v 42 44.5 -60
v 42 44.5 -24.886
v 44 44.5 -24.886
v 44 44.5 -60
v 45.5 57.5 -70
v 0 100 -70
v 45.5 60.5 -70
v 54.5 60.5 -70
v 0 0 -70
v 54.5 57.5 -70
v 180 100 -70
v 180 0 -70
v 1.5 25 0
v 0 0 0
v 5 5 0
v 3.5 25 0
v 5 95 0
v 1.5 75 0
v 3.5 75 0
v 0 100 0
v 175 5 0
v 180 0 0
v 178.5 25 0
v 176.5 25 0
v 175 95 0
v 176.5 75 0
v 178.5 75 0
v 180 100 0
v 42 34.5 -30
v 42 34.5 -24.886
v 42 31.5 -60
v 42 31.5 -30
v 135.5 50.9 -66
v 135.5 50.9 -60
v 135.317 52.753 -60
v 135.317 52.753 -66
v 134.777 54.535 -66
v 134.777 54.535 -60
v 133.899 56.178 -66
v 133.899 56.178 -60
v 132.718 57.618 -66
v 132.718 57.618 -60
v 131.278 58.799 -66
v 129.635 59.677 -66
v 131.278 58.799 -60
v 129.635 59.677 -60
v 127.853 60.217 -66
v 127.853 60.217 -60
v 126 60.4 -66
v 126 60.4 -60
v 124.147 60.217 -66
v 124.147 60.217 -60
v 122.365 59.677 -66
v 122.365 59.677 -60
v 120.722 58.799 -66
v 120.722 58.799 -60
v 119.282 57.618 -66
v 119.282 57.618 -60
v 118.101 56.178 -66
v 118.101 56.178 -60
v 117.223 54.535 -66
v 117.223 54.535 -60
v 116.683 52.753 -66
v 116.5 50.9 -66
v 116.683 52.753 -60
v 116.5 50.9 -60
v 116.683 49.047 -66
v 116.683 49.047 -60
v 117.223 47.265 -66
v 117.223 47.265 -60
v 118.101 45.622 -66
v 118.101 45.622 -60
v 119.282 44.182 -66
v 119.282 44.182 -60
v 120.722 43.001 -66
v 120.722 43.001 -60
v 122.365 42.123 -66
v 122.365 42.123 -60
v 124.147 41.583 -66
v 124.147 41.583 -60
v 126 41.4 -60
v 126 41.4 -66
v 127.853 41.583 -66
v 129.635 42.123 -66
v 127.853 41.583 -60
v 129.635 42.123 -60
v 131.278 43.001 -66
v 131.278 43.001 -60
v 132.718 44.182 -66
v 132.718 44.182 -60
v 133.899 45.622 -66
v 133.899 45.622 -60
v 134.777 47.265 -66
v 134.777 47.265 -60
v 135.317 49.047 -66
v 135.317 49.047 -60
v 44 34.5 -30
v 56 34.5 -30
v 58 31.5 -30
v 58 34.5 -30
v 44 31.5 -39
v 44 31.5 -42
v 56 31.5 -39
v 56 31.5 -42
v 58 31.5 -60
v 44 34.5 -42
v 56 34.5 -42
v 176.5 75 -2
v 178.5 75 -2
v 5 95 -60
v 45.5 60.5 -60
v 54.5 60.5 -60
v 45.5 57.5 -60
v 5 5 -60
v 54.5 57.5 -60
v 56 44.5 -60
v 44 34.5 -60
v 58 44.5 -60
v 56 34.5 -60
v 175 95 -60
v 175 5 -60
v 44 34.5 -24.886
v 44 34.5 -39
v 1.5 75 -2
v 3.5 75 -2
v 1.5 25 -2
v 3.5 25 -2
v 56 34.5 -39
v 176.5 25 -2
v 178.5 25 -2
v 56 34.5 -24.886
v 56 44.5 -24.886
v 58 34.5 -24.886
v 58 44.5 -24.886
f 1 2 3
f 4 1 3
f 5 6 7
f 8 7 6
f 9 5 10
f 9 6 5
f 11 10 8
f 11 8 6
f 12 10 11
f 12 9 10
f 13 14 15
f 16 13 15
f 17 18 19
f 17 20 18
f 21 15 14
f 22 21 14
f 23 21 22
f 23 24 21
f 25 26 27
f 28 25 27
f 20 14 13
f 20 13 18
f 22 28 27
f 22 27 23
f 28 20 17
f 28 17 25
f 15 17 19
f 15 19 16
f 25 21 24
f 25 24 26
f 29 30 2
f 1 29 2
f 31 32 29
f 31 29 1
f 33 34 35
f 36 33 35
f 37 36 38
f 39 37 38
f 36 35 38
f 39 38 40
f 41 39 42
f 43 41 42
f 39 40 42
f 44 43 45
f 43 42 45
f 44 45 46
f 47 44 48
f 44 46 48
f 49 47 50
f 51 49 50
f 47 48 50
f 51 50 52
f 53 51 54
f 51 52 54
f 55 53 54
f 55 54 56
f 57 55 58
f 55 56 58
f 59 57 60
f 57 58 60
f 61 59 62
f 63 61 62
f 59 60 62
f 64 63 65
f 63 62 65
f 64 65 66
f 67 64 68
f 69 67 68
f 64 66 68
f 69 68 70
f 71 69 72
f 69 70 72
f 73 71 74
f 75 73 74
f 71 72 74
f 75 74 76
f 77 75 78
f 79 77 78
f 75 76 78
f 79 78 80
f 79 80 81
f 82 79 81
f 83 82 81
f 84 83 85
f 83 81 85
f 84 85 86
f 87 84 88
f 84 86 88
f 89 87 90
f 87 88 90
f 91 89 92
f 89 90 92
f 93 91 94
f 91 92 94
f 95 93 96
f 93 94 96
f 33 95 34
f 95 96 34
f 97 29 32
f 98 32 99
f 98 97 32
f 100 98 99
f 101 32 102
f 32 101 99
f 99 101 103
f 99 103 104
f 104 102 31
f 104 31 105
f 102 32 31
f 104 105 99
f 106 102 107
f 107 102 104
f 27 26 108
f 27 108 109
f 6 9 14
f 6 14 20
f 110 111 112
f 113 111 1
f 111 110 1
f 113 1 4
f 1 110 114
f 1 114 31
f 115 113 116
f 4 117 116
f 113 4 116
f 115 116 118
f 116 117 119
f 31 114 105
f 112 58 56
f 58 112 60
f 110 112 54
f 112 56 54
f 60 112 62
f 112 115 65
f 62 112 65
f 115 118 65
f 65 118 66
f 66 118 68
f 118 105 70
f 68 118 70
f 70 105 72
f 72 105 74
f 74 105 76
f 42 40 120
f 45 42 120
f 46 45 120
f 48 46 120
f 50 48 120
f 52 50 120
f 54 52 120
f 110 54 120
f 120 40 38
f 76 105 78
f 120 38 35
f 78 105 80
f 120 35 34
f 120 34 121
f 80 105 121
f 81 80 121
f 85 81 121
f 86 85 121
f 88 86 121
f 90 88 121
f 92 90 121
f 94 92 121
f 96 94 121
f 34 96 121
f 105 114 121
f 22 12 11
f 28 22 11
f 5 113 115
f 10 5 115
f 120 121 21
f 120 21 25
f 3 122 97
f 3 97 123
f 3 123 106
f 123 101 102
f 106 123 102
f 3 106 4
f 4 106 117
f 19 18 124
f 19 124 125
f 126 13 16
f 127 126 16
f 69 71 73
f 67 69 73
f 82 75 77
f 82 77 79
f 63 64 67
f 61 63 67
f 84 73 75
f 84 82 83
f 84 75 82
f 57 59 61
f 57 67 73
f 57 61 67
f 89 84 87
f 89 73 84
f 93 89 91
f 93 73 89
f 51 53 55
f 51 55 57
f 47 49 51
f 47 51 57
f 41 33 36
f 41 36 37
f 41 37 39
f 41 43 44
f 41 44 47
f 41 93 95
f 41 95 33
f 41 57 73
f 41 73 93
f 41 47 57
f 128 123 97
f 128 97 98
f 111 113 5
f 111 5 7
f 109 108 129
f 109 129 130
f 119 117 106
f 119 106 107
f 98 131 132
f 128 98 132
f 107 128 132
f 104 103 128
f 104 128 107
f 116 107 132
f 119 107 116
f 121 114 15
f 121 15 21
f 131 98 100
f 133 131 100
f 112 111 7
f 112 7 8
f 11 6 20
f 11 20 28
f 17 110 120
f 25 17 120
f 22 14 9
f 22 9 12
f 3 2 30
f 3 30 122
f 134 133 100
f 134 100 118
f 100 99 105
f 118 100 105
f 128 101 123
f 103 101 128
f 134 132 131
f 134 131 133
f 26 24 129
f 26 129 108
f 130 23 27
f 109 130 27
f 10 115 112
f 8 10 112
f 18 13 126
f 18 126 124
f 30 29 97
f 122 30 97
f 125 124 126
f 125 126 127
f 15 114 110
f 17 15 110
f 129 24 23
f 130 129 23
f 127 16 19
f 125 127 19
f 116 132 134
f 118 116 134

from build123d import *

# Parameters (mm, degrees)
SCHIZZO1_W                   = 180
SCHIZZO1_H                   = 60
ESTRUSIONE_ESTRUSIONE1_DEPTH = 5
SCHIZZO1_3_W                 = 180
SCHIZZO1_3_H                 = 10
ESTRUSIONE_ESTRUSIONE2_DEPTH = 100
SCHIZZO2_W                   = 180
SCHIZZO2_H                   = 5
ESTRUSIONE_ESTRUSIONE3_DEPTH = 60
SCHIZZO3_W                   = 5
SCHIZZO3_H                   = 90
ESTRUSIONE_ESTRUSIONE4_DEPTH = 60
SCHIZZO4_W                   = 12
SCHIZZO4_H                   = 3
TAGLIO_ESTRUSIONE1_DEPTH     = 90
SCHIZZO6_W                   = 2
SCHIZZO6_H                   = 15.540639337
ESTRUSIONE_ESTRUSIONE5_DEPTH = 10
SCHIZZO10_W                  = 16
SCHIZZO10_H                  = 3
ESTRUSIONE_ESTRUSIONE7_DEPTH = 30
SCHIZZO11_W                  = 12
SCHIZZO11_H                  = 3
TAGLIO_ESTRUSIONE6_DEPTH     = 5
SCHIZZO12_W                  = 9
SCHIZZO12_H                  = 3
TAGLIO_ESTRUSIONE7_DEPTH     = 20
SCHIZZO13_W                  = 2
SCHIZZO13_H                  = 35.114164676
ESTRUSIONE_ESTRUSIONE8_DEPTH = 10
TAGLIO_ESTRUSIONE8_START     = -15.540639
SCHIZZO15_W                  = 21.926890516
SCHIZZO15_H                  = 11.981890919
TAGLIO_ESTRUSIONE8_DEPTH     = 15.540639
SCHIZZO16_W                  = 12
SCHIZZO16_H                  = 3
ESTRUSIONE_ESTRUSIONE9_DEPTH = 5
SCHIZZO17_R                  = 9.5
TAGLIO_ESTRUSIONE9_DEPTH     = 6
SCHIZZO21_W                  = 2
SCHIZZO21_H                  = 50
TAGLIO_ESTRUSIONE10_DEPTH    = 2


with BuildPart() as part:
    # Schizzo1 → Estrusione-Estrusione1 (new body)
    with BuildSketch(Plane(origin=(0, 0, 0), x_dir=(1, 0, 0), z_dir=(0, 1, 0))):
        with Locations((90, 30)):
            Rectangle(SCHIZZO1_W, SCHIZZO1_H)
    extrude(amount=ESTRUSIONE_ESTRUSIONE1_DEPTH)

    # Schizzo1<3> → Estrusione-Estrusione2 (add)
    with BuildSketch(Plane(origin=(0, 0, 0), x_dir=(1, 0, 0), z_dir=(0, 1, 0))):
        with Locations((90, 65)):
            Rectangle(SCHIZZO1_3_W, SCHIZZO1_3_H)
    extrude(amount=ESTRUSIONE_ESTRUSIONE2_DEPTH)

    # Schizzo2 → Estrusione-Estrusione3 (add)
    with BuildSketch(Plane.XY.offset(-60)):
        with Locations((90, 97.5)):
            Rectangle(SCHIZZO2_W, SCHIZZO2_H)
    extrude(amount=ESTRUSIONE_ESTRUSIONE3_DEPTH)

    # Schizzo3 → Estrusione-Estrusione4 (add)
    with BuildSketch(Plane.XY.offset(-60)):
        with Locations((2.5, 50)):
            Rectangle(SCHIZZO3_W, SCHIZZO3_H)
        with Locations((177.5, 50)):
            Rectangle(SCHIZZO3_W, SCHIZZO3_H)
    extrude(amount=ESTRUSIONE_ESTRUSIONE4_DEPTH)

    # Schizzo4 → Taglio-Estrusione1 (cut)
    with BuildSketch(Plane(origin=(0, 5, 0), x_dir=(1, 0, 0), z_dir=(0, 1, 0))):
        with Locations((50, 40.5)):
            Rectangle(SCHIZZO4_W, SCHIZZO4_H)
    extrude(amount=-TAGLIO_ESTRUSIONE1_DEPTH, mode=Mode.SUBTRACT)

    # Schizzo6 → Estrusione-Estrusione5 (add)
    with BuildSketch(Plane(origin=(0, 5, 0), x_dir=(1, 0, 0), z_dir=(0, 1, 0))):
        with Locations((43, 41.770319669)):
            Rectangle(SCHIZZO6_W, SCHIZZO6_H)
        with Locations((57, 41.770319669)):
            Rectangle(SCHIZZO6_W, SCHIZZO6_H)
    extrude(amount=ESTRUSIONE_ESTRUSIONE5_DEPTH)

    # Schizzo10 → Estrusione-Estrusione7 (add)
    with BuildSketch(Plane.XY.offset(-60)):
        with Locations((50, 33)):
            Rectangle(SCHIZZO10_W, SCHIZZO10_H)
    extrude(amount=ESTRUSIONE_ESTRUSIONE7_DEPTH)

    # Schizzo11 → Taglio-Estrusione6 (cut)
    with BuildSketch(Plane.XZ.offset(-31.5)):
        with Locations((50, -40.5)):
            Rectangle(SCHIZZO11_W, SCHIZZO11_H)
    extrude(amount=-TAGLIO_ESTRUSIONE6_DEPTH, mode=Mode.SUBTRACT)

    # Schizzo12 → Taglio-Estrusione7 (cut)
    with BuildSketch(Plane.XY.offset(-60)):
        with Locations((50, 59)):
            Rectangle(SCHIZZO12_W, SCHIZZO12_H)
    extrude(amount=-TAGLIO_ESTRUSIONE7_DEPTH, mode=Mode.SUBTRACT)

    # Schizzo13 → Estrusione-Estrusione8 (add)
    with BuildSketch(Plane(origin=(0, 34.5, 0), x_dir=(1, 0, 0), z_dir=(0, 1, 0))):
        with Locations((43, 42.442917662)):
            Rectangle(SCHIZZO13_W, SCHIZZO13_H)
        with Locations((57, 42.442917662)):
            Rectangle(SCHIZZO13_W, SCHIZZO13_H)
    extrude(amount=ESTRUSIONE_ESTRUSIONE8_DEPTH)

    # Schizzo15 → Taglio-Estrusione8 (cut)
    with BuildSketch(Plane.XY.offset(-34).offset(TAGLIO_ESTRUSIONE8_START)):
        with Locations((49.332767586, 10.99094546)):
            Rectangle(SCHIZZO15_W, SCHIZZO15_H)
    extrude(amount=TAGLIO_ESTRUSIONE8_DEPTH, mode=Mode.SUBTRACT)

    # Schizzo16 → Estrusione-Estrusione9 (add)
    with BuildSketch(Plane.XZ):
        with Locations((50, -40.5)):
            Rectangle(SCHIZZO16_W, SCHIZZO16_H)
    extrude(amount=-ESTRUSIONE_ESTRUSIONE9_DEPTH)

    # Schizzo17 → Taglio-Estrusione9 (cut)
    with BuildSketch(Plane.XY.offset(-60)):
        with Locations((126, 50.9)):
            Circle(SCHIZZO17_R)
    extrude(amount=-TAGLIO_ESTRUSIONE9_DEPTH, mode=Mode.SUBTRACT)

    # Schizzo21 → Taglio-Estrusione10 (cut)
    with BuildSketch(Plane.XY):
        with Locations((2.5, 50)):
            Rectangle(SCHIZZO21_W, SCHIZZO21_H)
        with Locations((177.5, 50)):
            Rectangle(SCHIZZO21_W, SCHIZZO21_H)
    extrude(amount=-TAGLIO_ESTRUSIONE10_DEPTH, mode=Mode.SUBTRACT)


solid = part.part
